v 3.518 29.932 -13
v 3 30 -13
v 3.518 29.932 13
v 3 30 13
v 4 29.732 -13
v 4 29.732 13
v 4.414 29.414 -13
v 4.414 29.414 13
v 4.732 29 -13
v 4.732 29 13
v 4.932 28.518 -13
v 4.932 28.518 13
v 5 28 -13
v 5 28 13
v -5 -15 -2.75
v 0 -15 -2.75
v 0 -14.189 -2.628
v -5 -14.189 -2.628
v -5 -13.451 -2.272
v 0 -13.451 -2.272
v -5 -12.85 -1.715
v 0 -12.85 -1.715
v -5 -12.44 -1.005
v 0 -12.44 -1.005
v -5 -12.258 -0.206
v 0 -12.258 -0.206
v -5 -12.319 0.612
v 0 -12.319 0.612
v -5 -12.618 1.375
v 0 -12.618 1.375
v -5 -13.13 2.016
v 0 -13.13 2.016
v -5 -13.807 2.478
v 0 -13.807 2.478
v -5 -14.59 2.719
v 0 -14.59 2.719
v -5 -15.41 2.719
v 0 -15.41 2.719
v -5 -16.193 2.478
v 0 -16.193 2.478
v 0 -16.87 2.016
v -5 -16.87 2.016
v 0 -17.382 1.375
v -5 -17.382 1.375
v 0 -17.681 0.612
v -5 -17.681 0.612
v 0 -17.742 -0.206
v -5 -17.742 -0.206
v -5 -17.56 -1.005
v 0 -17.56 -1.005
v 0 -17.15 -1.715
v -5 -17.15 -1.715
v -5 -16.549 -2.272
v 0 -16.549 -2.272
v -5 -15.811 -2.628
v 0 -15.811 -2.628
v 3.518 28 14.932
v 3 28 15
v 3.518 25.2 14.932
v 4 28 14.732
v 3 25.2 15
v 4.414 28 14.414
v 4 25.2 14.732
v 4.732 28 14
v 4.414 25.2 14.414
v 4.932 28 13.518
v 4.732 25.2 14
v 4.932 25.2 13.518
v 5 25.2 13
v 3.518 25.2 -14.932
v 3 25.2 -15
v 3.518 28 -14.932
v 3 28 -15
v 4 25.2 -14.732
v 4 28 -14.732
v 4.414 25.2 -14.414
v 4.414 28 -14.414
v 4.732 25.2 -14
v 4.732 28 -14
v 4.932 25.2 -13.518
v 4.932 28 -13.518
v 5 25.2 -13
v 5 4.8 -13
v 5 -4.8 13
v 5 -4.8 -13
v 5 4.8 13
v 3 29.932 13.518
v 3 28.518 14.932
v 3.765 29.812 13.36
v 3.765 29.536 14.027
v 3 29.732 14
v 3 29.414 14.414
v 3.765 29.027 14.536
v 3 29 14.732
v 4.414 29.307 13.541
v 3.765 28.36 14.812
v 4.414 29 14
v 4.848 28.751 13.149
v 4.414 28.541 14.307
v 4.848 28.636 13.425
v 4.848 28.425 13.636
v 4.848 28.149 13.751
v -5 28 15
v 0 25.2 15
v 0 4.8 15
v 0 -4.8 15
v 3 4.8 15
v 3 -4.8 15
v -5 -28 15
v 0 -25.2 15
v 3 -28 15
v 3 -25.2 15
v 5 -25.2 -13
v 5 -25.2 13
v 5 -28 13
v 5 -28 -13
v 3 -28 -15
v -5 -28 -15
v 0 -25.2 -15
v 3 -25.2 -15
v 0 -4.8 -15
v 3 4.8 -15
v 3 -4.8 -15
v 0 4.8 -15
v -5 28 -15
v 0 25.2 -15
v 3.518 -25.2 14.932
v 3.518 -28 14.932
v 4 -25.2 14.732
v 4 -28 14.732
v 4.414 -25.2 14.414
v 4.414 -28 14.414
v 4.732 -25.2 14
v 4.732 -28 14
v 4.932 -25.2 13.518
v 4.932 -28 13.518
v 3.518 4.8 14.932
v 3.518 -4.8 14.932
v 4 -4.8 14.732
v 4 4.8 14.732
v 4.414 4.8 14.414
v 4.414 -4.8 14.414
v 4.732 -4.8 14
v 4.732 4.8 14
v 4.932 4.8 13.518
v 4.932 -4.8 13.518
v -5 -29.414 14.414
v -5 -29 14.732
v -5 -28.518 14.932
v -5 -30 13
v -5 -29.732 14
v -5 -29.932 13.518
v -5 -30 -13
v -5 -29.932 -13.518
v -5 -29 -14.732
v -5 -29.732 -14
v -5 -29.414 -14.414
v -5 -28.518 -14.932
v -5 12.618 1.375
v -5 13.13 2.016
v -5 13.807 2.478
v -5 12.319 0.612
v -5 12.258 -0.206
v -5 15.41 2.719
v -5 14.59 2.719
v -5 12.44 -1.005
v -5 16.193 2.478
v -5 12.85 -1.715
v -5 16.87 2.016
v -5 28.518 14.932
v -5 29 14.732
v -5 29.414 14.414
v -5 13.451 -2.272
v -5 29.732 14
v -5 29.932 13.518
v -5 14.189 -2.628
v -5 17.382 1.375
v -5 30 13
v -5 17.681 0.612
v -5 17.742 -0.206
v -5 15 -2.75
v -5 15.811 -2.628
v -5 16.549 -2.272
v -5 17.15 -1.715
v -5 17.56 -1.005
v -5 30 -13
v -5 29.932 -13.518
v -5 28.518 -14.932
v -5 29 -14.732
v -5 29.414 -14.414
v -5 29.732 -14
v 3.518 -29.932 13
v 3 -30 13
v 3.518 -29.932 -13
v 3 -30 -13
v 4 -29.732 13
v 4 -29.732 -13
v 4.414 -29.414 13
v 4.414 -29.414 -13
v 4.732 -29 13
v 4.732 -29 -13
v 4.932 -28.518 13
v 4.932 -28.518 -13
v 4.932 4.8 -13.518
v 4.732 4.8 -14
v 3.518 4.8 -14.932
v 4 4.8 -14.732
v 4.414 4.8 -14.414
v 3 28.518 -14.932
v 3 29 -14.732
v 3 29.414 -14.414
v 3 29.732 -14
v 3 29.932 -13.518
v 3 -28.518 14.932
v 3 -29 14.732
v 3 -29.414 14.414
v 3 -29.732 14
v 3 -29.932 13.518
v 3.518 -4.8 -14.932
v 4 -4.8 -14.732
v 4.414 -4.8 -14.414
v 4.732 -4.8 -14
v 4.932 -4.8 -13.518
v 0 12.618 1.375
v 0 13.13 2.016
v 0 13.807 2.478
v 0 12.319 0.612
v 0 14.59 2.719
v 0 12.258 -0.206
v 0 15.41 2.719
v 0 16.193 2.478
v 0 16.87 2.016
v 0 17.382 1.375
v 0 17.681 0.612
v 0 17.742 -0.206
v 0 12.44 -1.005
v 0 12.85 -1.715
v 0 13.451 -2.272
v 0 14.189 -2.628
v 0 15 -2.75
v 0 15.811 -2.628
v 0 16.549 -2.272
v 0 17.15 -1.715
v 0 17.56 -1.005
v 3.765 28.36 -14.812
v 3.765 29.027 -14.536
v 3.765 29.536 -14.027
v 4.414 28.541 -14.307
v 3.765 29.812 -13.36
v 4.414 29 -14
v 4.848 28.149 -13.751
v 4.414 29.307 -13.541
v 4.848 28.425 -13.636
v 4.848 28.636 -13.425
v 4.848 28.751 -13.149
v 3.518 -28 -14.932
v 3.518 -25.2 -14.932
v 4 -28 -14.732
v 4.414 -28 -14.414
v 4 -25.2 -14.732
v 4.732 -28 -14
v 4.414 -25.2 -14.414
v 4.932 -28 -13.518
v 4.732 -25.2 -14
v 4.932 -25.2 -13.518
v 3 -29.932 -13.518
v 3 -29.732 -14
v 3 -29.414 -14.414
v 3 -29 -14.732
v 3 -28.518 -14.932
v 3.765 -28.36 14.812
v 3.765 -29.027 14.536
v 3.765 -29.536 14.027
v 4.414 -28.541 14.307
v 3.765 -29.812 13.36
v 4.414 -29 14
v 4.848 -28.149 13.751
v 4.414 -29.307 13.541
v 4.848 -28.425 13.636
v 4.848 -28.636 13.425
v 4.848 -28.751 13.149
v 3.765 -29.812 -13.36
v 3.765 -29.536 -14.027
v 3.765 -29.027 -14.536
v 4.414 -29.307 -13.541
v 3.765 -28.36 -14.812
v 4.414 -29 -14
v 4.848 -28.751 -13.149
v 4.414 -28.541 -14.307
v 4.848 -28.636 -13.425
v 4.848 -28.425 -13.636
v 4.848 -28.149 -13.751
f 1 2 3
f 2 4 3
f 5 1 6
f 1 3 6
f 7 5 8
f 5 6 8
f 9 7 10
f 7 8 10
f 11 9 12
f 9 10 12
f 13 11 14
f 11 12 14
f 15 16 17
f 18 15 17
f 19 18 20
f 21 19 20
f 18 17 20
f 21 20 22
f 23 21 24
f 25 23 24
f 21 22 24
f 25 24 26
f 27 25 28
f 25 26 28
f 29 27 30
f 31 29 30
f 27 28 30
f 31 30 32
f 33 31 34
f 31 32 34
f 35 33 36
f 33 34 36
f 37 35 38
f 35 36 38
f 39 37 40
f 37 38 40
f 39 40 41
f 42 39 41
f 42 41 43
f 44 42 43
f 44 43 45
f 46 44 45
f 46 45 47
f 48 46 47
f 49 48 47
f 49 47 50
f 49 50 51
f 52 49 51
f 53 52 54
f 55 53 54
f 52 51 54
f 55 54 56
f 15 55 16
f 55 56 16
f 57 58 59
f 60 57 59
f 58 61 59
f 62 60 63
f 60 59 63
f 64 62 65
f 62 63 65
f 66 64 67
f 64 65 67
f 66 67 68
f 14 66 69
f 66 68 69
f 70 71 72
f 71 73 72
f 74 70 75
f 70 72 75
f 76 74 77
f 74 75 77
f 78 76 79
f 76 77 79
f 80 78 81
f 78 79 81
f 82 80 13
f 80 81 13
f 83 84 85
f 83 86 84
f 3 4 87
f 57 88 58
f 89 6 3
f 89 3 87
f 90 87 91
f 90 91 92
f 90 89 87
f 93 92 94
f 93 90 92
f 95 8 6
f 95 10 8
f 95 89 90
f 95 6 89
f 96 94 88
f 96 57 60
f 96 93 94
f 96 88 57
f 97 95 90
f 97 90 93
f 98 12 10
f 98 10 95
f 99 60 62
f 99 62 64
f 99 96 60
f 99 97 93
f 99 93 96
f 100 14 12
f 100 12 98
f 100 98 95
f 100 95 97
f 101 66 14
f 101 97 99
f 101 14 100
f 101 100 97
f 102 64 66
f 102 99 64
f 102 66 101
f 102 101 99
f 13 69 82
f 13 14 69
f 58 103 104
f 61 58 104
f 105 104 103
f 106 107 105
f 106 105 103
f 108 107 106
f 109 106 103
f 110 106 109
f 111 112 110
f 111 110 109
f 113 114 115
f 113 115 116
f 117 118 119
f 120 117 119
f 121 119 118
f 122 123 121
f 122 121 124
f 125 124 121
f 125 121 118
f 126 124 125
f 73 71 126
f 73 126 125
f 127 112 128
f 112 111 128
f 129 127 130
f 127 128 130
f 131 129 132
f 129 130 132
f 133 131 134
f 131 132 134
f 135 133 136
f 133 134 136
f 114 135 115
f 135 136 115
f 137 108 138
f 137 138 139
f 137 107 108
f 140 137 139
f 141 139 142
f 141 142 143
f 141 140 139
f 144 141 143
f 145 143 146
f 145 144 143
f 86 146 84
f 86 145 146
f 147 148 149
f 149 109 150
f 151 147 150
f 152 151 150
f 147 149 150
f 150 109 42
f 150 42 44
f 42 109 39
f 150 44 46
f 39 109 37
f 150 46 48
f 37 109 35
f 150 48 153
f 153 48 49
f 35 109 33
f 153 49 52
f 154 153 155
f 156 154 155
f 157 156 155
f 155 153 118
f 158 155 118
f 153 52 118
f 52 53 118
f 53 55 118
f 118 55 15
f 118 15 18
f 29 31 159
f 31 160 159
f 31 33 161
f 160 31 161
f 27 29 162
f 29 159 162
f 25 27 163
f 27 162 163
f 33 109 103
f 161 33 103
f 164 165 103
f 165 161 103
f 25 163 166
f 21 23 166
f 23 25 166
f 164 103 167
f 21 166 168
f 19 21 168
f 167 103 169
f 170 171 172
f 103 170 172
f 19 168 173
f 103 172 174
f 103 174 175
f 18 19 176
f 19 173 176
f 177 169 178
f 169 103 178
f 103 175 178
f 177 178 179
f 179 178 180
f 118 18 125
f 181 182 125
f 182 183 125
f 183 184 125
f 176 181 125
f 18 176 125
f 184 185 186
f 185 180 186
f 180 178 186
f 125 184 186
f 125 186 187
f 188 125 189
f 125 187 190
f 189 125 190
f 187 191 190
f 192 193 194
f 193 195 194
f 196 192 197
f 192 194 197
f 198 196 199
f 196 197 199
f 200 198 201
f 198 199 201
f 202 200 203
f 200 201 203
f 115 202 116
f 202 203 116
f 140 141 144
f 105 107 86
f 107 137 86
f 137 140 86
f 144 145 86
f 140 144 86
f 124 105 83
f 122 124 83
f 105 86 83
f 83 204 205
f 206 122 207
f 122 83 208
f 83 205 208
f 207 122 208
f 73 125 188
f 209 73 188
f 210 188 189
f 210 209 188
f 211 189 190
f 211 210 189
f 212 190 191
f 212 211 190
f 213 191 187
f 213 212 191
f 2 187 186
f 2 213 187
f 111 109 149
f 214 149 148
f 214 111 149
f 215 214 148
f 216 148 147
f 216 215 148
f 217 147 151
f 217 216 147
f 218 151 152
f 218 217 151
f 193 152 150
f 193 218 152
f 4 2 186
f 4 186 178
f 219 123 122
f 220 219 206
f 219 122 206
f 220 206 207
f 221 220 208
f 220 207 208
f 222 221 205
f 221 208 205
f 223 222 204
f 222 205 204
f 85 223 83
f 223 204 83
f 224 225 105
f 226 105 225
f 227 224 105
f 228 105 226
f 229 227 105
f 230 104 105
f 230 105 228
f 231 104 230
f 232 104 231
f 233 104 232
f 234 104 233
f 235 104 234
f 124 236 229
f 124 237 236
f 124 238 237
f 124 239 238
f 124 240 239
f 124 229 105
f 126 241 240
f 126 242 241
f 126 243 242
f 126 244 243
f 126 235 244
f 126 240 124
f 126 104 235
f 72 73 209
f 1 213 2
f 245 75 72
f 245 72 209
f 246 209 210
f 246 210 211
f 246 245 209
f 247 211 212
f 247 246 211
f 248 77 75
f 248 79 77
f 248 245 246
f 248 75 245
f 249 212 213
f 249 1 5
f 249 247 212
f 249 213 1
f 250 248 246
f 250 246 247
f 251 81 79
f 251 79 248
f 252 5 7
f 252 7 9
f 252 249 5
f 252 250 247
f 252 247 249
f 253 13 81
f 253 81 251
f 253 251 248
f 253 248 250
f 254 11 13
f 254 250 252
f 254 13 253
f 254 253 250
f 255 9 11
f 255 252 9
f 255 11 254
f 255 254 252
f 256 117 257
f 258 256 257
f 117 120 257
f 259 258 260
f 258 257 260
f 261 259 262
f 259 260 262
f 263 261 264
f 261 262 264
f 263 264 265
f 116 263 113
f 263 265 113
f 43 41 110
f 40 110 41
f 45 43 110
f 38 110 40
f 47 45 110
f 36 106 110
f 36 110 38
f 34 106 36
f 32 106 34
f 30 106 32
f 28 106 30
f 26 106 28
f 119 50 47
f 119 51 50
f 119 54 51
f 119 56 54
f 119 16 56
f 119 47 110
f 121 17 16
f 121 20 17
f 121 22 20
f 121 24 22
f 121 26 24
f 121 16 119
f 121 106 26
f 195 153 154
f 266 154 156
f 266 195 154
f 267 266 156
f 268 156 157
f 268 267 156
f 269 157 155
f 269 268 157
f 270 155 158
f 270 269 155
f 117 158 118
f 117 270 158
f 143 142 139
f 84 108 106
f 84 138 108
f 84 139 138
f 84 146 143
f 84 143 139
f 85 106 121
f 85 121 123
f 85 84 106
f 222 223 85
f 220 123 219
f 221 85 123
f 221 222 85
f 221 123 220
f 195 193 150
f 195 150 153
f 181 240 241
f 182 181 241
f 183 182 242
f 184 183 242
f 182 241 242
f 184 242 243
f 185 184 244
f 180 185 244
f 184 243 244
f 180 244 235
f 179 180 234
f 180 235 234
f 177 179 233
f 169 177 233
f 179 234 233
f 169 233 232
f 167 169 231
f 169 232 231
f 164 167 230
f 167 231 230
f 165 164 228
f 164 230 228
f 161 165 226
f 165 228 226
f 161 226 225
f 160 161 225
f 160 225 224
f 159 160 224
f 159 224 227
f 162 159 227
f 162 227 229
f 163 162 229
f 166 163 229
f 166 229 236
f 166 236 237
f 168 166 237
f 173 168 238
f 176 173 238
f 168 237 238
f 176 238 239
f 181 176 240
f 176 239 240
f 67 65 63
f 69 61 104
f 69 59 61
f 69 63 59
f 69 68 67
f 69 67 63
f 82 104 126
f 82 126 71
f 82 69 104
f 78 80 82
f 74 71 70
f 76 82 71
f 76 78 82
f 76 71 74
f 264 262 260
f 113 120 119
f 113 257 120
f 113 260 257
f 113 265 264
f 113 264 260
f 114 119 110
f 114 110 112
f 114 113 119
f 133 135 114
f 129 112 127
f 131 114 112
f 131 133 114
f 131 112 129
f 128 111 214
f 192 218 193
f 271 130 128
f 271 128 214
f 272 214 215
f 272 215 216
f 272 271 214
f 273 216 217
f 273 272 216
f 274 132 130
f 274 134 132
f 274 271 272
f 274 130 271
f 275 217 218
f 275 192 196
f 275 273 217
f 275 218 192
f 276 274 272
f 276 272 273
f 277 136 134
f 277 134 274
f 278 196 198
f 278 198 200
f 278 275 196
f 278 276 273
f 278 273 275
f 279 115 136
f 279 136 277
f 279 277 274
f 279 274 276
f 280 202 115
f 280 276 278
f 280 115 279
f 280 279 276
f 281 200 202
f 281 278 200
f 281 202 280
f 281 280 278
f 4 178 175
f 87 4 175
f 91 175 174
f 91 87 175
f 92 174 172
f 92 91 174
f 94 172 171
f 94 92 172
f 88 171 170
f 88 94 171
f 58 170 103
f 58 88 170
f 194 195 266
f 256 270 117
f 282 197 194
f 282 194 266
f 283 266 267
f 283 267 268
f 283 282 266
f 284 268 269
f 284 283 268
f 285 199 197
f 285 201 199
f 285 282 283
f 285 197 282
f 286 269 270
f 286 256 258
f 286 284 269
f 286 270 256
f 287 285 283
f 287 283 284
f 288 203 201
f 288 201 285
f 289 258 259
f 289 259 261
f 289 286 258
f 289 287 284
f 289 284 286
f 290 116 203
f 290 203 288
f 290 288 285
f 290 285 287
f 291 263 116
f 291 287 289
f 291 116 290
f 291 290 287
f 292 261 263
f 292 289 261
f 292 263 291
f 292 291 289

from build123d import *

# Parameters (mm, degrees)
SKETCH_2_R      = 2.75
EXTRUDE_1_DEPTH = 5
EXTRUDE_START   = 5
SKETCH_4_W      = 30
SKETCH_4_H      = 9.6
EXTRUDE_2_DEPTH = 5
FILLET_1_R      = 2


with BuildPart() as part:
    # ｽｹｯﾁ2 → ﾎﾞｽ - 押し出し1 (new body)
    with BuildSketch(Plane(origin=(0, 0, 0), x_dir=(0, 0, -1), z_dir=(1, 0, 0))):
        with BuildLine():
            Line((-15, 28), (-15, -28))
            ThreePointArc((-15, -28), (-14.414213562, -29.414213562), (-13, -30))
            Line((-13, -30), (13, -30))
            ThreePointArc((13, -30), (14.414213562, -29.414213562), (15, -28))
            Line((15, -28), (15, 28))
            ThreePointArc((15, 28), (14.414213562, 29.414213562), (13, 30))
            Line((13, 30), (-13, 30))
            ThreePointArc((-13, 30), (-14.414213562, 29.414213562), (-15, 28))
        make_face()
        with Locations((0, 15)):
            Circle(SKETCH_2_R, mode=Mode.SUBTRACT)
        with Locations((0, -15)):
            Circle(SKETCH_2_R, mode=Mode.SUBTRACT)
    extrude(amount=-EXTRUDE_1_DEPTH)

    # ｽｹｯﾁ4 → ﾎﾞｽ - 押し出し2 (add)
    with BuildSketch(Plane(origin=(0, 0, 0), x_dir=(0, 0, -1), z_dir=(1, 0, 0)).offset(EXTRUDE_START)):
        with BuildLine():
            Line((-15, 28), (-15, 25.2))
            Line((-15, 25.2), (15, 25.2))
            Line((15, 25.2), (15, 28))
            ThreePointArc((15, 28), (14.414213562, 29.414213562), (13, 30))
            Line((13, 30), (-13, 30))
            ThreePointArc((-13, 30), (-14.414213562, 29.414213562), (-15, 28))
        make_face()
        Rectangle(SKETCH_4_W, SKETCH_4_H)
        with BuildLine():
            Line((15, -25.2), (-15, -25.2))
            Line((-15, -25.2), (-15, -28))
            ThreePointArc((-15, -28), (-14.414213562, -29.414213562), (-13, -30))
            Line((-13, -30), (13, -30))
            ThreePointArc((13, -30), (14.414213562, -29.414213562), (15, -28))
            Line((15, -28), (15, -25.2))
        make_face()
    extrude(amount=-EXTRUDE_2_DEPTH)

    # ﾌｨﾚｯﾄ1
    fillet_1_edges = [part.edges().sort_by_distance(p)[0] for p in [
        (5, 26.6, 15),
        (5, 26.6, -15),
        (5, 29.414213562, -14.414213562),
        (5, 30, 0),
        (5, 29.414213562, 14.414213562),
        (5, 0, -15),
        (5, 0, 15),
        (5, -26.6, -15),
        (5, -26.6, 15),
        (5, -29.414213562, 14.414213562),
        (5, -30, 0),
        (5, -29.414213562, -14.414213562),
    ]]
    fillet(fillet_1_edges, radius=FILLET_1_R)


solid = part.part
